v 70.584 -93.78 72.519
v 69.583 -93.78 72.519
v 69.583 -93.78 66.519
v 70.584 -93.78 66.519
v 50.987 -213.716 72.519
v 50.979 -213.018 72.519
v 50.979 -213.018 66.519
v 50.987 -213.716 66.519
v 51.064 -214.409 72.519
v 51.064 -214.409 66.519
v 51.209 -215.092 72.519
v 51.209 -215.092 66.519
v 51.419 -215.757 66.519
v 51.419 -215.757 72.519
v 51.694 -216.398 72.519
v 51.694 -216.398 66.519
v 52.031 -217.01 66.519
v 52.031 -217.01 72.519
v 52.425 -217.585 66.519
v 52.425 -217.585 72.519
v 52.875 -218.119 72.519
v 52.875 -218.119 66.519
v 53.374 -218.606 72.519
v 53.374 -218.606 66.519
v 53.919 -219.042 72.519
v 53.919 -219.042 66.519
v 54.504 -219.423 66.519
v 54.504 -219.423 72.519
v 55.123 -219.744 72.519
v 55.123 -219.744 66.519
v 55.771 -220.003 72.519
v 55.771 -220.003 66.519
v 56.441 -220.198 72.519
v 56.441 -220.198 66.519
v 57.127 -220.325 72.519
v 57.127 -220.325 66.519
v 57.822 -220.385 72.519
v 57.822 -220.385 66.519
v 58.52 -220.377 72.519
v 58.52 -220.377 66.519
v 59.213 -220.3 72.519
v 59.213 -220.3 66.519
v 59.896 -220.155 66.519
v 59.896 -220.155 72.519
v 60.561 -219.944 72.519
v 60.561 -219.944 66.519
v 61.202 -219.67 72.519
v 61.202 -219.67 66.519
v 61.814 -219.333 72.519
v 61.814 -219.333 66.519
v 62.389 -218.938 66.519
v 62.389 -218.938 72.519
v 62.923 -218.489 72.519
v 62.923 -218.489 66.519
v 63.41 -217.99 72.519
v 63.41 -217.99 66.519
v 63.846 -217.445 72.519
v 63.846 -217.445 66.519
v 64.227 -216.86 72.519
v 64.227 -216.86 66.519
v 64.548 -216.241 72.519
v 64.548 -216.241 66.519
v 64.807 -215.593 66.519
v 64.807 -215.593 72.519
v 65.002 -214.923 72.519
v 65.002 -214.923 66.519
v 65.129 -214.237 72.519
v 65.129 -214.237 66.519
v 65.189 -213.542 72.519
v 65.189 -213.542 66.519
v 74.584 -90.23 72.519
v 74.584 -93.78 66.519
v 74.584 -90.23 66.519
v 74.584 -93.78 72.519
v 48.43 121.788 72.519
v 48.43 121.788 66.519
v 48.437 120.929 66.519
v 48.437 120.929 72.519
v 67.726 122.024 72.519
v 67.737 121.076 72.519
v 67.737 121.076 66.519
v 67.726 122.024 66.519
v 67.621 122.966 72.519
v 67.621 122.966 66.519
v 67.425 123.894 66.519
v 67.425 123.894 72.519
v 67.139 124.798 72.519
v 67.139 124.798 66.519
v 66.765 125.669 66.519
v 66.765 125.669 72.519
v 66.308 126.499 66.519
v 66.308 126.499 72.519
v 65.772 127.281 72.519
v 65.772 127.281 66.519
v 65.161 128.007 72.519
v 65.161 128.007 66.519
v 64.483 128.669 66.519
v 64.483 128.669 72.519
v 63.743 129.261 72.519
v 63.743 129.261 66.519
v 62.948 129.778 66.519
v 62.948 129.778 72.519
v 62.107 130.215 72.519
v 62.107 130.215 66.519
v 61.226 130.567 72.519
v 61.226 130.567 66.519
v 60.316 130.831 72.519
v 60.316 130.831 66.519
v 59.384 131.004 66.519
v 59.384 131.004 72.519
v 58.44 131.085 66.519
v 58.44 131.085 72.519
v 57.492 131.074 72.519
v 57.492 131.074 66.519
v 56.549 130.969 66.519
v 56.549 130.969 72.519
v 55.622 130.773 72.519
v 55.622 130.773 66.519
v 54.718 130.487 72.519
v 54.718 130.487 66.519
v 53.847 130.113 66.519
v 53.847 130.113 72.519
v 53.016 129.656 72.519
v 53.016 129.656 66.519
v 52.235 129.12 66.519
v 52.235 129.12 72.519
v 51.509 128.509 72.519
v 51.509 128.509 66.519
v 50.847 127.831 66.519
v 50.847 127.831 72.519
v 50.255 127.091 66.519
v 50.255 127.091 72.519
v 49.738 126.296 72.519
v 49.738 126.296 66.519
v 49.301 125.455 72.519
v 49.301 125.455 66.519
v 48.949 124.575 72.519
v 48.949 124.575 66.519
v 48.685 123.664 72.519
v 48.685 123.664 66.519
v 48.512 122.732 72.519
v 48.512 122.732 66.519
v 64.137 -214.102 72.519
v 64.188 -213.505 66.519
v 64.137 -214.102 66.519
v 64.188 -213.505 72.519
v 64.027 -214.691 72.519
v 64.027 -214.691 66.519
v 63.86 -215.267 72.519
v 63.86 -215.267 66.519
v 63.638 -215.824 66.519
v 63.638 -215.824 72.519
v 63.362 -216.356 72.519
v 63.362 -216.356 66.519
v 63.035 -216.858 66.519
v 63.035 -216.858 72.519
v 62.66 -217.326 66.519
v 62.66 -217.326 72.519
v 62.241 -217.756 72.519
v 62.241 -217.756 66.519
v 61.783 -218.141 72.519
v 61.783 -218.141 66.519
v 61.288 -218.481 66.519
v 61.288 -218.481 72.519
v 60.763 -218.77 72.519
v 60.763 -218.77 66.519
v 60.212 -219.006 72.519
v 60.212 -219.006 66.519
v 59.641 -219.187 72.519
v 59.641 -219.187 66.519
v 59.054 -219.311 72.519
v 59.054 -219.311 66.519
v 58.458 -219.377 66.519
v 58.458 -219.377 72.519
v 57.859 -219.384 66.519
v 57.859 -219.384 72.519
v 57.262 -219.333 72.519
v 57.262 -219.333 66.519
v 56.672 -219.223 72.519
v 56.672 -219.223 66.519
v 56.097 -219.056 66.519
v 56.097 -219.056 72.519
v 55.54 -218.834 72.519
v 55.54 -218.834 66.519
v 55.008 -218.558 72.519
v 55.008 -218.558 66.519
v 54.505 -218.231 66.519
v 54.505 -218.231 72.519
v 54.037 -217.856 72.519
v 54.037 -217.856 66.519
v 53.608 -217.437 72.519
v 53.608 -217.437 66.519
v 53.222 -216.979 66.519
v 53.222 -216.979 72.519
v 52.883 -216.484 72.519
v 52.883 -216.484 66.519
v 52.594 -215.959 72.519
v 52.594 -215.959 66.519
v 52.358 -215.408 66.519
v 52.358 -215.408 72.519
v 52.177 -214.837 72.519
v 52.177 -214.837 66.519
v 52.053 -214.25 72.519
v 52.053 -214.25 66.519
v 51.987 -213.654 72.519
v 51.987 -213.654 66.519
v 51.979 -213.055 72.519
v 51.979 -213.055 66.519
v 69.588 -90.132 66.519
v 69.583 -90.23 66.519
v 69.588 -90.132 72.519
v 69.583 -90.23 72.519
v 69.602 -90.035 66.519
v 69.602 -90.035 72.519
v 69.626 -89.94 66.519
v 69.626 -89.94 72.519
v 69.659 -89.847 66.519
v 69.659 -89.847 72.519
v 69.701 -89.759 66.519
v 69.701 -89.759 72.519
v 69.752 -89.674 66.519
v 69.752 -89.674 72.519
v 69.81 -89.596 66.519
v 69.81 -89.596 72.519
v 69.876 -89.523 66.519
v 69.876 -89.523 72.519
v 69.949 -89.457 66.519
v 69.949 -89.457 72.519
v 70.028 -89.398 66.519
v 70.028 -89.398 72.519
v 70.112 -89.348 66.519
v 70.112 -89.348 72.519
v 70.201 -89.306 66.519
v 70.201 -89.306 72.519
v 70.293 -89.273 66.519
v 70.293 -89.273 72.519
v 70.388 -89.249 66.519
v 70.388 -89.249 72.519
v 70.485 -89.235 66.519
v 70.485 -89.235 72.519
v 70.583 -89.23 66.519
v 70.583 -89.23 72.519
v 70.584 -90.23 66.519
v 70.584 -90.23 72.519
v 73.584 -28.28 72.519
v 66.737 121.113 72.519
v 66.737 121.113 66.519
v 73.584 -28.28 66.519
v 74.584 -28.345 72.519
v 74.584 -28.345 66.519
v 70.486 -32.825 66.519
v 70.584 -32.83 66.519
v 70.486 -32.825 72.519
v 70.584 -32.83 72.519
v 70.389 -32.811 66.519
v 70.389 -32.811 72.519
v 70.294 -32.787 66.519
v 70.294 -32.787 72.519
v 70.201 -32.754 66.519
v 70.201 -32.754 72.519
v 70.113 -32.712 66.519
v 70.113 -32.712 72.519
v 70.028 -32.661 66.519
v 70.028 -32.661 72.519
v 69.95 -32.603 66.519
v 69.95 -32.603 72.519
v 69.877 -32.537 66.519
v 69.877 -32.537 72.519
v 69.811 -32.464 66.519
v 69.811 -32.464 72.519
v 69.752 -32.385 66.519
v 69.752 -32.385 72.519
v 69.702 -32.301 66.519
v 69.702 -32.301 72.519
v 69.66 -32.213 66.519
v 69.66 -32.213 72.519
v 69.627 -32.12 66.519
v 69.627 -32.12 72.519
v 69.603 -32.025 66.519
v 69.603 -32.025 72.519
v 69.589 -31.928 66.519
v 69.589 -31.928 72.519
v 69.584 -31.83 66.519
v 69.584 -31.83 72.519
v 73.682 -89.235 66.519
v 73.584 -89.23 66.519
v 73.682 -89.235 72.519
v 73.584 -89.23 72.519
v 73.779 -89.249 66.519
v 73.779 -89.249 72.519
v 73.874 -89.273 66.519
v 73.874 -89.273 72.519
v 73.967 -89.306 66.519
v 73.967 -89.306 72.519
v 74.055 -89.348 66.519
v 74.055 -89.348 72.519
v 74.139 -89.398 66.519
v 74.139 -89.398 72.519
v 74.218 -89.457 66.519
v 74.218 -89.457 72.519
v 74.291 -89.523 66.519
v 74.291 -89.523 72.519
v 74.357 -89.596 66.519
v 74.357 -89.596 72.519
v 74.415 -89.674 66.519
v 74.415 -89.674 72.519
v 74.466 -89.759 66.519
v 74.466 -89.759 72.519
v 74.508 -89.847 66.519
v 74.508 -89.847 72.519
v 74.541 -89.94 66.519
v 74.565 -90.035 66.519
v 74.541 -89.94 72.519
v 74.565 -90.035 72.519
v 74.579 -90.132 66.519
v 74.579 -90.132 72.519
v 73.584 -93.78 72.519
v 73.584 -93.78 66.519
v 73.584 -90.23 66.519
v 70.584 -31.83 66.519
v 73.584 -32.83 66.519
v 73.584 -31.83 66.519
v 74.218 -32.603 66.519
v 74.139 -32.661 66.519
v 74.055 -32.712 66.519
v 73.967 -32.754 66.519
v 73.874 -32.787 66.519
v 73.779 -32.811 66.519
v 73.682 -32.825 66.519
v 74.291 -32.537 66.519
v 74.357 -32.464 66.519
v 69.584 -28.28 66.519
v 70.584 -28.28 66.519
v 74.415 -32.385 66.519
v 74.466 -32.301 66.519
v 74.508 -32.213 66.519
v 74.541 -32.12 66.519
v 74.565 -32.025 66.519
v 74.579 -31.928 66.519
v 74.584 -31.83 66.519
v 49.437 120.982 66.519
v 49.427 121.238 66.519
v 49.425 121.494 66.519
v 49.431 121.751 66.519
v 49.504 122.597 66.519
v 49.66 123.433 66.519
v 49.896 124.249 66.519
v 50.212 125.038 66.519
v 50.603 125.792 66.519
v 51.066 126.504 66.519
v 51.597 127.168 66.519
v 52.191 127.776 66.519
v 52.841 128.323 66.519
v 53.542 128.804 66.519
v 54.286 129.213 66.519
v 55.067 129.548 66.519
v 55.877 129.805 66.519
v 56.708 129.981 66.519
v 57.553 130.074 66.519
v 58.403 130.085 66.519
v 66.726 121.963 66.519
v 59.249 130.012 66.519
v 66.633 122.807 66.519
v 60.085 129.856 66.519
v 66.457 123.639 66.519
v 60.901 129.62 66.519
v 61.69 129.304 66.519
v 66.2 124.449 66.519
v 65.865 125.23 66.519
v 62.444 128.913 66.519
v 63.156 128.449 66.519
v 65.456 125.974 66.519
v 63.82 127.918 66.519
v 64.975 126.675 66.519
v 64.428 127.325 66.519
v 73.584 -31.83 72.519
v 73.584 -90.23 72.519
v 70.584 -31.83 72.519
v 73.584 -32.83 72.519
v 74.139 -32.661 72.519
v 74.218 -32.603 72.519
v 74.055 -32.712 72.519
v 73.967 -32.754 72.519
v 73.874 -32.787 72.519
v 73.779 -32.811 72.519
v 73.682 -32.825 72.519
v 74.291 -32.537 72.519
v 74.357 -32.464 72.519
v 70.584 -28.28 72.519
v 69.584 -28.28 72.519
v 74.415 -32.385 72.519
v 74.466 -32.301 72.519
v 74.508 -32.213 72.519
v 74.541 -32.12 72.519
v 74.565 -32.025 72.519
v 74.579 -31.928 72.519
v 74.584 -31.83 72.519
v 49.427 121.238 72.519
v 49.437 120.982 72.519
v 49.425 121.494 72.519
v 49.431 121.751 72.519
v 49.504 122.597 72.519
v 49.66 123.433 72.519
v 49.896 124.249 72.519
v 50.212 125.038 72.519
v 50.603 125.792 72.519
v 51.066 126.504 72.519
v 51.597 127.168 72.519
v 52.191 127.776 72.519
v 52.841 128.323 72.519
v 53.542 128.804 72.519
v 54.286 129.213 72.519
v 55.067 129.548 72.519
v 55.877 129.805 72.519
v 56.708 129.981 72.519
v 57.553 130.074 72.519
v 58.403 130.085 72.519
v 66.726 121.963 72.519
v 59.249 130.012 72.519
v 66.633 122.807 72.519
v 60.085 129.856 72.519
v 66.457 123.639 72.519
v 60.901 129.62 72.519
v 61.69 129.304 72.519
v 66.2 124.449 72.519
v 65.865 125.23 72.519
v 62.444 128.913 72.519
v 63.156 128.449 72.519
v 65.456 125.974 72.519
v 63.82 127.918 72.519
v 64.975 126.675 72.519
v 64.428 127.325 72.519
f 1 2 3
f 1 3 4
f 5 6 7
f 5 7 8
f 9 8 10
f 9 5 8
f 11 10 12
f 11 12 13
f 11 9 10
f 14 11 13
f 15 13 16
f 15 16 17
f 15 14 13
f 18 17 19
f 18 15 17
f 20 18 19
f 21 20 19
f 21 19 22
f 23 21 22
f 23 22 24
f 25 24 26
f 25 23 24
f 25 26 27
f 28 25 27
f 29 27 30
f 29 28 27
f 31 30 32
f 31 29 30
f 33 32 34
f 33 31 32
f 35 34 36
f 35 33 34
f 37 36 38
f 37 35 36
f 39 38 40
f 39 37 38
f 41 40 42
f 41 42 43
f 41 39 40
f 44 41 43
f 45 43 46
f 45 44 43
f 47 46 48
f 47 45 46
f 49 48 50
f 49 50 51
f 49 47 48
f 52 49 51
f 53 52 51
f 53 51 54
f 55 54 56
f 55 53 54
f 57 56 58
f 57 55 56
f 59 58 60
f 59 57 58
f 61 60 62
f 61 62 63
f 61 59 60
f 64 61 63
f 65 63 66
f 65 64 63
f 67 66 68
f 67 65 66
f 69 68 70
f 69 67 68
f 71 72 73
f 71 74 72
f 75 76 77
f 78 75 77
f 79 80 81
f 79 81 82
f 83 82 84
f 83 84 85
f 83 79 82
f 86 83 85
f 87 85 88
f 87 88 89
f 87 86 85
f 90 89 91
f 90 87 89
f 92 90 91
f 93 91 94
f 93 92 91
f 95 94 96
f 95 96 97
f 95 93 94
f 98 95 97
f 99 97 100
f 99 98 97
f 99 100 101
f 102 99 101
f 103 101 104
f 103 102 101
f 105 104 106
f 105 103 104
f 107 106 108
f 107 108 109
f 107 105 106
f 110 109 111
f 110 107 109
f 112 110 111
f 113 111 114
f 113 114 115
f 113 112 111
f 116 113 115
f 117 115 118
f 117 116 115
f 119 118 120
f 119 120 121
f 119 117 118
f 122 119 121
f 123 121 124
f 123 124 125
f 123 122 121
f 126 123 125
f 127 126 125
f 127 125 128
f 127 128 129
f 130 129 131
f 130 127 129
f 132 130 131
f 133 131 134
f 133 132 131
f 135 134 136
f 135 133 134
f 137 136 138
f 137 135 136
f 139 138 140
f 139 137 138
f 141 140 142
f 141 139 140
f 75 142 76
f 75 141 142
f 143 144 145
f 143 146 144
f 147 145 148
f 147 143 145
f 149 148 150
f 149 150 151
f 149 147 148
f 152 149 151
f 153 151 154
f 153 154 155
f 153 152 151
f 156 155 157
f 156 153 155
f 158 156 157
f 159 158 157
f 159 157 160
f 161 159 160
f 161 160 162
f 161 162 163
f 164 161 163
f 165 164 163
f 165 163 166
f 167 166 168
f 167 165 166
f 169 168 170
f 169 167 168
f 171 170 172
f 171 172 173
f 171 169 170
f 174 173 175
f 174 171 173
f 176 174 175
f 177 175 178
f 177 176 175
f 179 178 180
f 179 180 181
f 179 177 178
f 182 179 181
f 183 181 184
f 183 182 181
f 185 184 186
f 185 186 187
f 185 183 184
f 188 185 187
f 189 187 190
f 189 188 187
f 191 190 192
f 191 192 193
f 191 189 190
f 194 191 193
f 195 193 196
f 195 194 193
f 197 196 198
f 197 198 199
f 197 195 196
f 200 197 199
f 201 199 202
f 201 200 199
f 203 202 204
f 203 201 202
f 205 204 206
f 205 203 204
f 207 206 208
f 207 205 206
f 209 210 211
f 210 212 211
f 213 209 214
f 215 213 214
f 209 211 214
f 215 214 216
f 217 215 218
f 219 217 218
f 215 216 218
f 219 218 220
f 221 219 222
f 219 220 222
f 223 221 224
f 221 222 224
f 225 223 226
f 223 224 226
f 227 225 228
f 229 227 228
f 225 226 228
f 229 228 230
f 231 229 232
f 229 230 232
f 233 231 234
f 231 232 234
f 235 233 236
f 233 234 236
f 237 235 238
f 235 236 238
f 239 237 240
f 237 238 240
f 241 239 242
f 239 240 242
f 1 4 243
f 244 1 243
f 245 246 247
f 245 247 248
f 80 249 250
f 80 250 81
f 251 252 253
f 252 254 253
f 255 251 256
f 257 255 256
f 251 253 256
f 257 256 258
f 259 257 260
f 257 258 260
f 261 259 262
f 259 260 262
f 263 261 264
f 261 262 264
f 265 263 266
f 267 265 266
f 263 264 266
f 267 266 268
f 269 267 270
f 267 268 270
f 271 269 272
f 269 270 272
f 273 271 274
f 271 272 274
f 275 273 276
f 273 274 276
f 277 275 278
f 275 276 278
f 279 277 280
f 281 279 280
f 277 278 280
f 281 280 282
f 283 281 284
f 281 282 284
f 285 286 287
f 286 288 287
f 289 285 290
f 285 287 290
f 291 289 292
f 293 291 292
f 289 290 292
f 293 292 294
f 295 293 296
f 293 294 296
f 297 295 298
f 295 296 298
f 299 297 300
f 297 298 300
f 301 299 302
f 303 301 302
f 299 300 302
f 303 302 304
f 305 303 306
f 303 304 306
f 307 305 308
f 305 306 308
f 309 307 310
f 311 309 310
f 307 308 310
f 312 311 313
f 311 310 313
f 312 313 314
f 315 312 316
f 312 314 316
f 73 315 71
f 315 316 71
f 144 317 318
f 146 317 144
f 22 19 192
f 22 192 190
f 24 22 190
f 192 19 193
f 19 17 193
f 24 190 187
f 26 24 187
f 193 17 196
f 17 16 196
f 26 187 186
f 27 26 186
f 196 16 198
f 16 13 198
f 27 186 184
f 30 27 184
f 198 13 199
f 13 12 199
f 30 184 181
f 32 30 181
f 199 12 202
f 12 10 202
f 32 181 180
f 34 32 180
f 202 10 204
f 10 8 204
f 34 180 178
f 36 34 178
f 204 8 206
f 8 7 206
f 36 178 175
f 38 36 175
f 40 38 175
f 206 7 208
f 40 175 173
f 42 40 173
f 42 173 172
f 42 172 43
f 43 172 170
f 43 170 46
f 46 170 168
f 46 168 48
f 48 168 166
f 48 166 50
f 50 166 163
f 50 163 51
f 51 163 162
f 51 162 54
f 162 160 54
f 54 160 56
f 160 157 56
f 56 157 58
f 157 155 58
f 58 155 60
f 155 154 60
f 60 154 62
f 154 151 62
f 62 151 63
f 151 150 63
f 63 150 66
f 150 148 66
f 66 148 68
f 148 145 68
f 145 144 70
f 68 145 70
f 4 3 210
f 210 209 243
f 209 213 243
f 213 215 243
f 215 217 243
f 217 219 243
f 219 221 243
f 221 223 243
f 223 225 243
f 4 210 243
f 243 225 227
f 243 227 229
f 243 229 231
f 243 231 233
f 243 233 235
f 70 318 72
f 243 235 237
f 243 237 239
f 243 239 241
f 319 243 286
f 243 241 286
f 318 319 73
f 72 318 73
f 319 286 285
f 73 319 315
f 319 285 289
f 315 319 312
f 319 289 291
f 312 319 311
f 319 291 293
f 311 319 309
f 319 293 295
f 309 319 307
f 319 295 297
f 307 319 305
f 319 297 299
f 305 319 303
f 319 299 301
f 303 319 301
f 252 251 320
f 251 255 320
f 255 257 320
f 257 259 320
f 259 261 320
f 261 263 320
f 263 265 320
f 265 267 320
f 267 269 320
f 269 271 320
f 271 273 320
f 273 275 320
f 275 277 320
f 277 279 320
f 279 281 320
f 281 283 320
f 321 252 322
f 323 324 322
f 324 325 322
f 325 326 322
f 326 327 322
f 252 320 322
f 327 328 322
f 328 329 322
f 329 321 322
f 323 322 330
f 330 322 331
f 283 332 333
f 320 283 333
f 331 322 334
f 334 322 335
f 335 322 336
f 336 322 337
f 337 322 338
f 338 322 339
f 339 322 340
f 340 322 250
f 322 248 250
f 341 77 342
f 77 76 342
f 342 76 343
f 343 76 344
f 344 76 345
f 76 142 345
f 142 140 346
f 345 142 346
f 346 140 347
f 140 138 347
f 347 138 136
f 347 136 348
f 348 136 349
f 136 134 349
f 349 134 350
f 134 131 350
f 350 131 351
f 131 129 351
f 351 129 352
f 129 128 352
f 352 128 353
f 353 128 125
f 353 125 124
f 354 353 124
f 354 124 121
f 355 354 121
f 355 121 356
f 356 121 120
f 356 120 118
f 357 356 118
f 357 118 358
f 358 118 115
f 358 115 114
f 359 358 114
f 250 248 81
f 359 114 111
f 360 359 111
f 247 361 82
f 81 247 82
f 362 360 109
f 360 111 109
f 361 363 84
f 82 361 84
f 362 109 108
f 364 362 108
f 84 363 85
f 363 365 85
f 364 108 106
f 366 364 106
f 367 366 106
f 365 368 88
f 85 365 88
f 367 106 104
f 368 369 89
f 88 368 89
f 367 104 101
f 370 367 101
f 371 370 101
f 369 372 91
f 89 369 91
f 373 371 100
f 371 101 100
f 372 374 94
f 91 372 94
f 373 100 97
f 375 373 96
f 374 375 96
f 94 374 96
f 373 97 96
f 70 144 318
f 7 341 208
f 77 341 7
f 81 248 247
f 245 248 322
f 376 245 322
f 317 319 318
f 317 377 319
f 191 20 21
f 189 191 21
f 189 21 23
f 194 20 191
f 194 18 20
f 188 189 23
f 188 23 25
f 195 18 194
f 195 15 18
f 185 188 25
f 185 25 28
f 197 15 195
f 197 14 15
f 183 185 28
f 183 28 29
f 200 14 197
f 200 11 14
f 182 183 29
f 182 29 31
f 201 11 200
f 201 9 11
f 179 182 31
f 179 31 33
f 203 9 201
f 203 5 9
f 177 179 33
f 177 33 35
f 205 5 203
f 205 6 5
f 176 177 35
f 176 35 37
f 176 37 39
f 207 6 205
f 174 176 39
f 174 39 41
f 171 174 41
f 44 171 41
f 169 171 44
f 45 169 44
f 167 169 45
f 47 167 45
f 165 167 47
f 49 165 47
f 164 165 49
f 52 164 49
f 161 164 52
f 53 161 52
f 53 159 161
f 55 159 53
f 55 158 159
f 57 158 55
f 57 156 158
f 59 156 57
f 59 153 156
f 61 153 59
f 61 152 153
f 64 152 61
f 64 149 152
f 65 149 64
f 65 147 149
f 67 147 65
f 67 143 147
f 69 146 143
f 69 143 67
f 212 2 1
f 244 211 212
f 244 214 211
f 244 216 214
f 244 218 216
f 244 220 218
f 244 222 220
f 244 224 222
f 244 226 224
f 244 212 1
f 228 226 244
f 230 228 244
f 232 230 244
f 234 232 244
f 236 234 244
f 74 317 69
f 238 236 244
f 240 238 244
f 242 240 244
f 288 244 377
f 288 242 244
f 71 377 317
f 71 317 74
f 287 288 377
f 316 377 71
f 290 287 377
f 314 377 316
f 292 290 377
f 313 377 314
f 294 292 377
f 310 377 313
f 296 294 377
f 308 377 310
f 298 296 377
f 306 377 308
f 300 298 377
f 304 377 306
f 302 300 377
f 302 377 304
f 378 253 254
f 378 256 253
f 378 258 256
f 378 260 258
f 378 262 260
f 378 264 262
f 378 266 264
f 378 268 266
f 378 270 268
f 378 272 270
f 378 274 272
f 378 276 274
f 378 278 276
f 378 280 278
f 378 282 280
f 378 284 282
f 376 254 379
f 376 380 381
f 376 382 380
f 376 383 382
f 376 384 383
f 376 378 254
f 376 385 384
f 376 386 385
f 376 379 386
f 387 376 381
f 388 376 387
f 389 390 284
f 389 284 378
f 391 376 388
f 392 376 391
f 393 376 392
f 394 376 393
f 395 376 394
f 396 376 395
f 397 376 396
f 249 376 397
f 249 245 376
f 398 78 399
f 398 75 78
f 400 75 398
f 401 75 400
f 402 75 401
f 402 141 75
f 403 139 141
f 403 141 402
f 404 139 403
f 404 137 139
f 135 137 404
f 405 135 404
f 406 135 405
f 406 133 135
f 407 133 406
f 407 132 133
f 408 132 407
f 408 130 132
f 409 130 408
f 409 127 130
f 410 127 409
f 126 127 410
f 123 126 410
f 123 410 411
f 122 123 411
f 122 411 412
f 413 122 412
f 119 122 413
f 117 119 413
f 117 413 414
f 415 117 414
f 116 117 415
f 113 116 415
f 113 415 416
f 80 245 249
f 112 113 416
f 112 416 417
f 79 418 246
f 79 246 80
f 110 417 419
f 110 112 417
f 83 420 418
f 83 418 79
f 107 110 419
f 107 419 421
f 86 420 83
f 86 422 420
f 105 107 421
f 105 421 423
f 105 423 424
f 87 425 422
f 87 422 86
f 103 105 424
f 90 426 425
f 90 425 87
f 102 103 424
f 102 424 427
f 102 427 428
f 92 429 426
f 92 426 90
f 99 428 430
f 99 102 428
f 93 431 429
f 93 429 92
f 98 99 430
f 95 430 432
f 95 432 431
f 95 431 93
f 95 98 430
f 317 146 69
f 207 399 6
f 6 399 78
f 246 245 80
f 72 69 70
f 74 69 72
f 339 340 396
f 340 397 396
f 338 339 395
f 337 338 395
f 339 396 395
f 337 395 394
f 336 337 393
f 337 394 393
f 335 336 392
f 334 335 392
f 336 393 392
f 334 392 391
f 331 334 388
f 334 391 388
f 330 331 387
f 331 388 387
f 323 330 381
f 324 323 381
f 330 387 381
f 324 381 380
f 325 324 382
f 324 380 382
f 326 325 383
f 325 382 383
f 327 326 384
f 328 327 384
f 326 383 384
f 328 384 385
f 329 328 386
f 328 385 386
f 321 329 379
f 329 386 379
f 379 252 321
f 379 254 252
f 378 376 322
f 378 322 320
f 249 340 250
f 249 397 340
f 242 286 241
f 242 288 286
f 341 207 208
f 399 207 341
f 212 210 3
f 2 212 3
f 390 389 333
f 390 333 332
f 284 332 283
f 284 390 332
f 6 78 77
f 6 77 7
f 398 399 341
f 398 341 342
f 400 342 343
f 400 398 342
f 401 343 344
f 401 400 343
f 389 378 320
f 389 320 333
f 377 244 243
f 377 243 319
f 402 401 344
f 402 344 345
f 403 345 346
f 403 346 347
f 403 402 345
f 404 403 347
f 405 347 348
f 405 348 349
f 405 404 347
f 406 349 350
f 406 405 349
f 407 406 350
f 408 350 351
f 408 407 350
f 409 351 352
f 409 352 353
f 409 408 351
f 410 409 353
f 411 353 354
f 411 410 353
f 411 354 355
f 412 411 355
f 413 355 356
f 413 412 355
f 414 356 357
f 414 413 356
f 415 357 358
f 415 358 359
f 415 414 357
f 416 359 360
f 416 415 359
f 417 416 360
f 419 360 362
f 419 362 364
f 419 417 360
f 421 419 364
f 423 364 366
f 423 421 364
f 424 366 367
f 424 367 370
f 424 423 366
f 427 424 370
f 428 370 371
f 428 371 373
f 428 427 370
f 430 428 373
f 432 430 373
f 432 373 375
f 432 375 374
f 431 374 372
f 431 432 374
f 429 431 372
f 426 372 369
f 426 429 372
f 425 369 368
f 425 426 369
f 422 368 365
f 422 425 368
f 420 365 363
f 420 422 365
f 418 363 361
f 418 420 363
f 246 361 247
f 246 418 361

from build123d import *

# Parameters (mm, degrees)
BOSS_EXTRUDE1_DEPTH      = 3
BOSS_EXTRUDE1_DEPTH_BACK = 3
FILLET1_R                = 1


with BuildPart() as part:
    # Sketch2 → Boss-Extrude1 (new, two sides: drawn at the far end of the back side and taken through both)
    with BuildSketch(Plane(origin=(58.08391713634872, 121.43198942232709, 69.51869342732661), x_dir=(0.9993220722541541, -0.03681570189013682, 0), z_dir=(-1e-17, -3.5e-15, 1)).offset(-BOSS_EXTRUDE1_DEPTH_BACK)):
        with BuildLine():
            ThreePointArc((18.431354186205805, -334.4850073073481), (12.322654184920047, -340.5937073086338), (6.213954183634288, -334.4850073073481))
            Line((6.213954183634306, -334.4850073073481), (-8.624506729994131, -0.7684841044992936))
            ThreePointArc((-8.624506729991177, -0.7684841044991735), (-8.65013007423404, -0.38462170162740245), (-8.658676813147078, -1.6281e-13))
            ThreePointArc((-8.658676813147078, -1.6281e-13), (-1.47473e-12, 8.658676813145437), (8.658676813144126, -1.6653e-13))
            Line((8.658676813144126, -1.6653e-13), (21.0012414551849, -149.0397805610325))
            Line((21.0012414551849, -149.0397805610325), (21.13193719689482, -152.58737391753476))
            Line((21.13193719689482, -152.58737391753476), (18.133970980132357, -152.69782102320517))
            Line((18.133970980132357, -152.69782102320517), (18.003275238422436, -149.15022766670293))
            Line((18.003275238422436, -149.15022766670293), (17.00395316616828, -149.187043368593))
            Line((17.00395316616828, -149.187043368593), (17.171464609768407, -153.73395879734946))
            Line((17.171464609768407, -153.73395879734946), (22.168074971039157, -153.54988028789876))
            Line((22.168074971039157, -153.54988028789876), (22.00294469020588, -149.06759892527108))
            Line((22.00294469020588, -149.06759892527108), (9.659999999998522, -1.7053e-13))
            ThreePointArc((9.659999999998522, -1.6653e-13), (-1.47867e-12, 9.659999999999831), (-9.660000000001478, -1.6979e-13))
            Line((-9.660000000001478, -1.6653e-13), (-9.621878236414362, -0.8573559375786474))
            Line((-9.621878236414362, -0.8573559375786474), (5.212654183767356, -334.4850073073481))
            ThreePointArc((5.2126541837673726, -334.4850073073481), (12.322654184920088, -341.5950073085008), (19.43265418607275, -334.48500730734804))
            Line((19.43265418607274, -334.48500730734804), (24.411992001243018, -214.4585605917896))
            Line((24.411992001243018, -214.4585605917896), (24.24448055764289, -209.91164516303309))
            Line((24.24448055764289, -209.91164516303309), (19.247192268626275, -210.09574864780103))
            Line((19.247192268626275, -210.09574864780103), (19.414703712226398, -214.64266407655742))
            Line((19.414703712226398, -214.64266407655742), (20.414703712226398, -214.60582339935002))
            Line((20.414703712226398, -214.60582339935002), (20.284007970516445, -211.05823004284775))
            Line((20.284007970516445, -211.05823004284775), (23.28197418727881, -210.94778293717735))
            Line((23.28197418727881, -210.94778293717735), (23.412669928988862, -214.4953762936796))
            Line((23.412669928988862, -214.4953762936796), (18.431354186205787, -334.4850073073481))
        make_face()
    extrude(amount=BOSS_EXTRUDE1_DEPTH + BOSS_EXTRUDE1_DEPTH_BACK)

    # Fillet1
    fillet1_edges = [part.edges().sort_by_distance(p)[0] for p in [
        (69.5832387487039, -89.22992838096525, 69.51869342732587),
        (74.58391713634757, -89.22992838096522, 69.51869342732587),
        (69.58391713634755, -32.829928380965185, 69.51869342732607),
        (74.58391713634754, -32.829928380965185, 69.51869342732607),
    ]]
    fillet(fillet1_edges, radius=FILLET1_R)


solid = part.part
